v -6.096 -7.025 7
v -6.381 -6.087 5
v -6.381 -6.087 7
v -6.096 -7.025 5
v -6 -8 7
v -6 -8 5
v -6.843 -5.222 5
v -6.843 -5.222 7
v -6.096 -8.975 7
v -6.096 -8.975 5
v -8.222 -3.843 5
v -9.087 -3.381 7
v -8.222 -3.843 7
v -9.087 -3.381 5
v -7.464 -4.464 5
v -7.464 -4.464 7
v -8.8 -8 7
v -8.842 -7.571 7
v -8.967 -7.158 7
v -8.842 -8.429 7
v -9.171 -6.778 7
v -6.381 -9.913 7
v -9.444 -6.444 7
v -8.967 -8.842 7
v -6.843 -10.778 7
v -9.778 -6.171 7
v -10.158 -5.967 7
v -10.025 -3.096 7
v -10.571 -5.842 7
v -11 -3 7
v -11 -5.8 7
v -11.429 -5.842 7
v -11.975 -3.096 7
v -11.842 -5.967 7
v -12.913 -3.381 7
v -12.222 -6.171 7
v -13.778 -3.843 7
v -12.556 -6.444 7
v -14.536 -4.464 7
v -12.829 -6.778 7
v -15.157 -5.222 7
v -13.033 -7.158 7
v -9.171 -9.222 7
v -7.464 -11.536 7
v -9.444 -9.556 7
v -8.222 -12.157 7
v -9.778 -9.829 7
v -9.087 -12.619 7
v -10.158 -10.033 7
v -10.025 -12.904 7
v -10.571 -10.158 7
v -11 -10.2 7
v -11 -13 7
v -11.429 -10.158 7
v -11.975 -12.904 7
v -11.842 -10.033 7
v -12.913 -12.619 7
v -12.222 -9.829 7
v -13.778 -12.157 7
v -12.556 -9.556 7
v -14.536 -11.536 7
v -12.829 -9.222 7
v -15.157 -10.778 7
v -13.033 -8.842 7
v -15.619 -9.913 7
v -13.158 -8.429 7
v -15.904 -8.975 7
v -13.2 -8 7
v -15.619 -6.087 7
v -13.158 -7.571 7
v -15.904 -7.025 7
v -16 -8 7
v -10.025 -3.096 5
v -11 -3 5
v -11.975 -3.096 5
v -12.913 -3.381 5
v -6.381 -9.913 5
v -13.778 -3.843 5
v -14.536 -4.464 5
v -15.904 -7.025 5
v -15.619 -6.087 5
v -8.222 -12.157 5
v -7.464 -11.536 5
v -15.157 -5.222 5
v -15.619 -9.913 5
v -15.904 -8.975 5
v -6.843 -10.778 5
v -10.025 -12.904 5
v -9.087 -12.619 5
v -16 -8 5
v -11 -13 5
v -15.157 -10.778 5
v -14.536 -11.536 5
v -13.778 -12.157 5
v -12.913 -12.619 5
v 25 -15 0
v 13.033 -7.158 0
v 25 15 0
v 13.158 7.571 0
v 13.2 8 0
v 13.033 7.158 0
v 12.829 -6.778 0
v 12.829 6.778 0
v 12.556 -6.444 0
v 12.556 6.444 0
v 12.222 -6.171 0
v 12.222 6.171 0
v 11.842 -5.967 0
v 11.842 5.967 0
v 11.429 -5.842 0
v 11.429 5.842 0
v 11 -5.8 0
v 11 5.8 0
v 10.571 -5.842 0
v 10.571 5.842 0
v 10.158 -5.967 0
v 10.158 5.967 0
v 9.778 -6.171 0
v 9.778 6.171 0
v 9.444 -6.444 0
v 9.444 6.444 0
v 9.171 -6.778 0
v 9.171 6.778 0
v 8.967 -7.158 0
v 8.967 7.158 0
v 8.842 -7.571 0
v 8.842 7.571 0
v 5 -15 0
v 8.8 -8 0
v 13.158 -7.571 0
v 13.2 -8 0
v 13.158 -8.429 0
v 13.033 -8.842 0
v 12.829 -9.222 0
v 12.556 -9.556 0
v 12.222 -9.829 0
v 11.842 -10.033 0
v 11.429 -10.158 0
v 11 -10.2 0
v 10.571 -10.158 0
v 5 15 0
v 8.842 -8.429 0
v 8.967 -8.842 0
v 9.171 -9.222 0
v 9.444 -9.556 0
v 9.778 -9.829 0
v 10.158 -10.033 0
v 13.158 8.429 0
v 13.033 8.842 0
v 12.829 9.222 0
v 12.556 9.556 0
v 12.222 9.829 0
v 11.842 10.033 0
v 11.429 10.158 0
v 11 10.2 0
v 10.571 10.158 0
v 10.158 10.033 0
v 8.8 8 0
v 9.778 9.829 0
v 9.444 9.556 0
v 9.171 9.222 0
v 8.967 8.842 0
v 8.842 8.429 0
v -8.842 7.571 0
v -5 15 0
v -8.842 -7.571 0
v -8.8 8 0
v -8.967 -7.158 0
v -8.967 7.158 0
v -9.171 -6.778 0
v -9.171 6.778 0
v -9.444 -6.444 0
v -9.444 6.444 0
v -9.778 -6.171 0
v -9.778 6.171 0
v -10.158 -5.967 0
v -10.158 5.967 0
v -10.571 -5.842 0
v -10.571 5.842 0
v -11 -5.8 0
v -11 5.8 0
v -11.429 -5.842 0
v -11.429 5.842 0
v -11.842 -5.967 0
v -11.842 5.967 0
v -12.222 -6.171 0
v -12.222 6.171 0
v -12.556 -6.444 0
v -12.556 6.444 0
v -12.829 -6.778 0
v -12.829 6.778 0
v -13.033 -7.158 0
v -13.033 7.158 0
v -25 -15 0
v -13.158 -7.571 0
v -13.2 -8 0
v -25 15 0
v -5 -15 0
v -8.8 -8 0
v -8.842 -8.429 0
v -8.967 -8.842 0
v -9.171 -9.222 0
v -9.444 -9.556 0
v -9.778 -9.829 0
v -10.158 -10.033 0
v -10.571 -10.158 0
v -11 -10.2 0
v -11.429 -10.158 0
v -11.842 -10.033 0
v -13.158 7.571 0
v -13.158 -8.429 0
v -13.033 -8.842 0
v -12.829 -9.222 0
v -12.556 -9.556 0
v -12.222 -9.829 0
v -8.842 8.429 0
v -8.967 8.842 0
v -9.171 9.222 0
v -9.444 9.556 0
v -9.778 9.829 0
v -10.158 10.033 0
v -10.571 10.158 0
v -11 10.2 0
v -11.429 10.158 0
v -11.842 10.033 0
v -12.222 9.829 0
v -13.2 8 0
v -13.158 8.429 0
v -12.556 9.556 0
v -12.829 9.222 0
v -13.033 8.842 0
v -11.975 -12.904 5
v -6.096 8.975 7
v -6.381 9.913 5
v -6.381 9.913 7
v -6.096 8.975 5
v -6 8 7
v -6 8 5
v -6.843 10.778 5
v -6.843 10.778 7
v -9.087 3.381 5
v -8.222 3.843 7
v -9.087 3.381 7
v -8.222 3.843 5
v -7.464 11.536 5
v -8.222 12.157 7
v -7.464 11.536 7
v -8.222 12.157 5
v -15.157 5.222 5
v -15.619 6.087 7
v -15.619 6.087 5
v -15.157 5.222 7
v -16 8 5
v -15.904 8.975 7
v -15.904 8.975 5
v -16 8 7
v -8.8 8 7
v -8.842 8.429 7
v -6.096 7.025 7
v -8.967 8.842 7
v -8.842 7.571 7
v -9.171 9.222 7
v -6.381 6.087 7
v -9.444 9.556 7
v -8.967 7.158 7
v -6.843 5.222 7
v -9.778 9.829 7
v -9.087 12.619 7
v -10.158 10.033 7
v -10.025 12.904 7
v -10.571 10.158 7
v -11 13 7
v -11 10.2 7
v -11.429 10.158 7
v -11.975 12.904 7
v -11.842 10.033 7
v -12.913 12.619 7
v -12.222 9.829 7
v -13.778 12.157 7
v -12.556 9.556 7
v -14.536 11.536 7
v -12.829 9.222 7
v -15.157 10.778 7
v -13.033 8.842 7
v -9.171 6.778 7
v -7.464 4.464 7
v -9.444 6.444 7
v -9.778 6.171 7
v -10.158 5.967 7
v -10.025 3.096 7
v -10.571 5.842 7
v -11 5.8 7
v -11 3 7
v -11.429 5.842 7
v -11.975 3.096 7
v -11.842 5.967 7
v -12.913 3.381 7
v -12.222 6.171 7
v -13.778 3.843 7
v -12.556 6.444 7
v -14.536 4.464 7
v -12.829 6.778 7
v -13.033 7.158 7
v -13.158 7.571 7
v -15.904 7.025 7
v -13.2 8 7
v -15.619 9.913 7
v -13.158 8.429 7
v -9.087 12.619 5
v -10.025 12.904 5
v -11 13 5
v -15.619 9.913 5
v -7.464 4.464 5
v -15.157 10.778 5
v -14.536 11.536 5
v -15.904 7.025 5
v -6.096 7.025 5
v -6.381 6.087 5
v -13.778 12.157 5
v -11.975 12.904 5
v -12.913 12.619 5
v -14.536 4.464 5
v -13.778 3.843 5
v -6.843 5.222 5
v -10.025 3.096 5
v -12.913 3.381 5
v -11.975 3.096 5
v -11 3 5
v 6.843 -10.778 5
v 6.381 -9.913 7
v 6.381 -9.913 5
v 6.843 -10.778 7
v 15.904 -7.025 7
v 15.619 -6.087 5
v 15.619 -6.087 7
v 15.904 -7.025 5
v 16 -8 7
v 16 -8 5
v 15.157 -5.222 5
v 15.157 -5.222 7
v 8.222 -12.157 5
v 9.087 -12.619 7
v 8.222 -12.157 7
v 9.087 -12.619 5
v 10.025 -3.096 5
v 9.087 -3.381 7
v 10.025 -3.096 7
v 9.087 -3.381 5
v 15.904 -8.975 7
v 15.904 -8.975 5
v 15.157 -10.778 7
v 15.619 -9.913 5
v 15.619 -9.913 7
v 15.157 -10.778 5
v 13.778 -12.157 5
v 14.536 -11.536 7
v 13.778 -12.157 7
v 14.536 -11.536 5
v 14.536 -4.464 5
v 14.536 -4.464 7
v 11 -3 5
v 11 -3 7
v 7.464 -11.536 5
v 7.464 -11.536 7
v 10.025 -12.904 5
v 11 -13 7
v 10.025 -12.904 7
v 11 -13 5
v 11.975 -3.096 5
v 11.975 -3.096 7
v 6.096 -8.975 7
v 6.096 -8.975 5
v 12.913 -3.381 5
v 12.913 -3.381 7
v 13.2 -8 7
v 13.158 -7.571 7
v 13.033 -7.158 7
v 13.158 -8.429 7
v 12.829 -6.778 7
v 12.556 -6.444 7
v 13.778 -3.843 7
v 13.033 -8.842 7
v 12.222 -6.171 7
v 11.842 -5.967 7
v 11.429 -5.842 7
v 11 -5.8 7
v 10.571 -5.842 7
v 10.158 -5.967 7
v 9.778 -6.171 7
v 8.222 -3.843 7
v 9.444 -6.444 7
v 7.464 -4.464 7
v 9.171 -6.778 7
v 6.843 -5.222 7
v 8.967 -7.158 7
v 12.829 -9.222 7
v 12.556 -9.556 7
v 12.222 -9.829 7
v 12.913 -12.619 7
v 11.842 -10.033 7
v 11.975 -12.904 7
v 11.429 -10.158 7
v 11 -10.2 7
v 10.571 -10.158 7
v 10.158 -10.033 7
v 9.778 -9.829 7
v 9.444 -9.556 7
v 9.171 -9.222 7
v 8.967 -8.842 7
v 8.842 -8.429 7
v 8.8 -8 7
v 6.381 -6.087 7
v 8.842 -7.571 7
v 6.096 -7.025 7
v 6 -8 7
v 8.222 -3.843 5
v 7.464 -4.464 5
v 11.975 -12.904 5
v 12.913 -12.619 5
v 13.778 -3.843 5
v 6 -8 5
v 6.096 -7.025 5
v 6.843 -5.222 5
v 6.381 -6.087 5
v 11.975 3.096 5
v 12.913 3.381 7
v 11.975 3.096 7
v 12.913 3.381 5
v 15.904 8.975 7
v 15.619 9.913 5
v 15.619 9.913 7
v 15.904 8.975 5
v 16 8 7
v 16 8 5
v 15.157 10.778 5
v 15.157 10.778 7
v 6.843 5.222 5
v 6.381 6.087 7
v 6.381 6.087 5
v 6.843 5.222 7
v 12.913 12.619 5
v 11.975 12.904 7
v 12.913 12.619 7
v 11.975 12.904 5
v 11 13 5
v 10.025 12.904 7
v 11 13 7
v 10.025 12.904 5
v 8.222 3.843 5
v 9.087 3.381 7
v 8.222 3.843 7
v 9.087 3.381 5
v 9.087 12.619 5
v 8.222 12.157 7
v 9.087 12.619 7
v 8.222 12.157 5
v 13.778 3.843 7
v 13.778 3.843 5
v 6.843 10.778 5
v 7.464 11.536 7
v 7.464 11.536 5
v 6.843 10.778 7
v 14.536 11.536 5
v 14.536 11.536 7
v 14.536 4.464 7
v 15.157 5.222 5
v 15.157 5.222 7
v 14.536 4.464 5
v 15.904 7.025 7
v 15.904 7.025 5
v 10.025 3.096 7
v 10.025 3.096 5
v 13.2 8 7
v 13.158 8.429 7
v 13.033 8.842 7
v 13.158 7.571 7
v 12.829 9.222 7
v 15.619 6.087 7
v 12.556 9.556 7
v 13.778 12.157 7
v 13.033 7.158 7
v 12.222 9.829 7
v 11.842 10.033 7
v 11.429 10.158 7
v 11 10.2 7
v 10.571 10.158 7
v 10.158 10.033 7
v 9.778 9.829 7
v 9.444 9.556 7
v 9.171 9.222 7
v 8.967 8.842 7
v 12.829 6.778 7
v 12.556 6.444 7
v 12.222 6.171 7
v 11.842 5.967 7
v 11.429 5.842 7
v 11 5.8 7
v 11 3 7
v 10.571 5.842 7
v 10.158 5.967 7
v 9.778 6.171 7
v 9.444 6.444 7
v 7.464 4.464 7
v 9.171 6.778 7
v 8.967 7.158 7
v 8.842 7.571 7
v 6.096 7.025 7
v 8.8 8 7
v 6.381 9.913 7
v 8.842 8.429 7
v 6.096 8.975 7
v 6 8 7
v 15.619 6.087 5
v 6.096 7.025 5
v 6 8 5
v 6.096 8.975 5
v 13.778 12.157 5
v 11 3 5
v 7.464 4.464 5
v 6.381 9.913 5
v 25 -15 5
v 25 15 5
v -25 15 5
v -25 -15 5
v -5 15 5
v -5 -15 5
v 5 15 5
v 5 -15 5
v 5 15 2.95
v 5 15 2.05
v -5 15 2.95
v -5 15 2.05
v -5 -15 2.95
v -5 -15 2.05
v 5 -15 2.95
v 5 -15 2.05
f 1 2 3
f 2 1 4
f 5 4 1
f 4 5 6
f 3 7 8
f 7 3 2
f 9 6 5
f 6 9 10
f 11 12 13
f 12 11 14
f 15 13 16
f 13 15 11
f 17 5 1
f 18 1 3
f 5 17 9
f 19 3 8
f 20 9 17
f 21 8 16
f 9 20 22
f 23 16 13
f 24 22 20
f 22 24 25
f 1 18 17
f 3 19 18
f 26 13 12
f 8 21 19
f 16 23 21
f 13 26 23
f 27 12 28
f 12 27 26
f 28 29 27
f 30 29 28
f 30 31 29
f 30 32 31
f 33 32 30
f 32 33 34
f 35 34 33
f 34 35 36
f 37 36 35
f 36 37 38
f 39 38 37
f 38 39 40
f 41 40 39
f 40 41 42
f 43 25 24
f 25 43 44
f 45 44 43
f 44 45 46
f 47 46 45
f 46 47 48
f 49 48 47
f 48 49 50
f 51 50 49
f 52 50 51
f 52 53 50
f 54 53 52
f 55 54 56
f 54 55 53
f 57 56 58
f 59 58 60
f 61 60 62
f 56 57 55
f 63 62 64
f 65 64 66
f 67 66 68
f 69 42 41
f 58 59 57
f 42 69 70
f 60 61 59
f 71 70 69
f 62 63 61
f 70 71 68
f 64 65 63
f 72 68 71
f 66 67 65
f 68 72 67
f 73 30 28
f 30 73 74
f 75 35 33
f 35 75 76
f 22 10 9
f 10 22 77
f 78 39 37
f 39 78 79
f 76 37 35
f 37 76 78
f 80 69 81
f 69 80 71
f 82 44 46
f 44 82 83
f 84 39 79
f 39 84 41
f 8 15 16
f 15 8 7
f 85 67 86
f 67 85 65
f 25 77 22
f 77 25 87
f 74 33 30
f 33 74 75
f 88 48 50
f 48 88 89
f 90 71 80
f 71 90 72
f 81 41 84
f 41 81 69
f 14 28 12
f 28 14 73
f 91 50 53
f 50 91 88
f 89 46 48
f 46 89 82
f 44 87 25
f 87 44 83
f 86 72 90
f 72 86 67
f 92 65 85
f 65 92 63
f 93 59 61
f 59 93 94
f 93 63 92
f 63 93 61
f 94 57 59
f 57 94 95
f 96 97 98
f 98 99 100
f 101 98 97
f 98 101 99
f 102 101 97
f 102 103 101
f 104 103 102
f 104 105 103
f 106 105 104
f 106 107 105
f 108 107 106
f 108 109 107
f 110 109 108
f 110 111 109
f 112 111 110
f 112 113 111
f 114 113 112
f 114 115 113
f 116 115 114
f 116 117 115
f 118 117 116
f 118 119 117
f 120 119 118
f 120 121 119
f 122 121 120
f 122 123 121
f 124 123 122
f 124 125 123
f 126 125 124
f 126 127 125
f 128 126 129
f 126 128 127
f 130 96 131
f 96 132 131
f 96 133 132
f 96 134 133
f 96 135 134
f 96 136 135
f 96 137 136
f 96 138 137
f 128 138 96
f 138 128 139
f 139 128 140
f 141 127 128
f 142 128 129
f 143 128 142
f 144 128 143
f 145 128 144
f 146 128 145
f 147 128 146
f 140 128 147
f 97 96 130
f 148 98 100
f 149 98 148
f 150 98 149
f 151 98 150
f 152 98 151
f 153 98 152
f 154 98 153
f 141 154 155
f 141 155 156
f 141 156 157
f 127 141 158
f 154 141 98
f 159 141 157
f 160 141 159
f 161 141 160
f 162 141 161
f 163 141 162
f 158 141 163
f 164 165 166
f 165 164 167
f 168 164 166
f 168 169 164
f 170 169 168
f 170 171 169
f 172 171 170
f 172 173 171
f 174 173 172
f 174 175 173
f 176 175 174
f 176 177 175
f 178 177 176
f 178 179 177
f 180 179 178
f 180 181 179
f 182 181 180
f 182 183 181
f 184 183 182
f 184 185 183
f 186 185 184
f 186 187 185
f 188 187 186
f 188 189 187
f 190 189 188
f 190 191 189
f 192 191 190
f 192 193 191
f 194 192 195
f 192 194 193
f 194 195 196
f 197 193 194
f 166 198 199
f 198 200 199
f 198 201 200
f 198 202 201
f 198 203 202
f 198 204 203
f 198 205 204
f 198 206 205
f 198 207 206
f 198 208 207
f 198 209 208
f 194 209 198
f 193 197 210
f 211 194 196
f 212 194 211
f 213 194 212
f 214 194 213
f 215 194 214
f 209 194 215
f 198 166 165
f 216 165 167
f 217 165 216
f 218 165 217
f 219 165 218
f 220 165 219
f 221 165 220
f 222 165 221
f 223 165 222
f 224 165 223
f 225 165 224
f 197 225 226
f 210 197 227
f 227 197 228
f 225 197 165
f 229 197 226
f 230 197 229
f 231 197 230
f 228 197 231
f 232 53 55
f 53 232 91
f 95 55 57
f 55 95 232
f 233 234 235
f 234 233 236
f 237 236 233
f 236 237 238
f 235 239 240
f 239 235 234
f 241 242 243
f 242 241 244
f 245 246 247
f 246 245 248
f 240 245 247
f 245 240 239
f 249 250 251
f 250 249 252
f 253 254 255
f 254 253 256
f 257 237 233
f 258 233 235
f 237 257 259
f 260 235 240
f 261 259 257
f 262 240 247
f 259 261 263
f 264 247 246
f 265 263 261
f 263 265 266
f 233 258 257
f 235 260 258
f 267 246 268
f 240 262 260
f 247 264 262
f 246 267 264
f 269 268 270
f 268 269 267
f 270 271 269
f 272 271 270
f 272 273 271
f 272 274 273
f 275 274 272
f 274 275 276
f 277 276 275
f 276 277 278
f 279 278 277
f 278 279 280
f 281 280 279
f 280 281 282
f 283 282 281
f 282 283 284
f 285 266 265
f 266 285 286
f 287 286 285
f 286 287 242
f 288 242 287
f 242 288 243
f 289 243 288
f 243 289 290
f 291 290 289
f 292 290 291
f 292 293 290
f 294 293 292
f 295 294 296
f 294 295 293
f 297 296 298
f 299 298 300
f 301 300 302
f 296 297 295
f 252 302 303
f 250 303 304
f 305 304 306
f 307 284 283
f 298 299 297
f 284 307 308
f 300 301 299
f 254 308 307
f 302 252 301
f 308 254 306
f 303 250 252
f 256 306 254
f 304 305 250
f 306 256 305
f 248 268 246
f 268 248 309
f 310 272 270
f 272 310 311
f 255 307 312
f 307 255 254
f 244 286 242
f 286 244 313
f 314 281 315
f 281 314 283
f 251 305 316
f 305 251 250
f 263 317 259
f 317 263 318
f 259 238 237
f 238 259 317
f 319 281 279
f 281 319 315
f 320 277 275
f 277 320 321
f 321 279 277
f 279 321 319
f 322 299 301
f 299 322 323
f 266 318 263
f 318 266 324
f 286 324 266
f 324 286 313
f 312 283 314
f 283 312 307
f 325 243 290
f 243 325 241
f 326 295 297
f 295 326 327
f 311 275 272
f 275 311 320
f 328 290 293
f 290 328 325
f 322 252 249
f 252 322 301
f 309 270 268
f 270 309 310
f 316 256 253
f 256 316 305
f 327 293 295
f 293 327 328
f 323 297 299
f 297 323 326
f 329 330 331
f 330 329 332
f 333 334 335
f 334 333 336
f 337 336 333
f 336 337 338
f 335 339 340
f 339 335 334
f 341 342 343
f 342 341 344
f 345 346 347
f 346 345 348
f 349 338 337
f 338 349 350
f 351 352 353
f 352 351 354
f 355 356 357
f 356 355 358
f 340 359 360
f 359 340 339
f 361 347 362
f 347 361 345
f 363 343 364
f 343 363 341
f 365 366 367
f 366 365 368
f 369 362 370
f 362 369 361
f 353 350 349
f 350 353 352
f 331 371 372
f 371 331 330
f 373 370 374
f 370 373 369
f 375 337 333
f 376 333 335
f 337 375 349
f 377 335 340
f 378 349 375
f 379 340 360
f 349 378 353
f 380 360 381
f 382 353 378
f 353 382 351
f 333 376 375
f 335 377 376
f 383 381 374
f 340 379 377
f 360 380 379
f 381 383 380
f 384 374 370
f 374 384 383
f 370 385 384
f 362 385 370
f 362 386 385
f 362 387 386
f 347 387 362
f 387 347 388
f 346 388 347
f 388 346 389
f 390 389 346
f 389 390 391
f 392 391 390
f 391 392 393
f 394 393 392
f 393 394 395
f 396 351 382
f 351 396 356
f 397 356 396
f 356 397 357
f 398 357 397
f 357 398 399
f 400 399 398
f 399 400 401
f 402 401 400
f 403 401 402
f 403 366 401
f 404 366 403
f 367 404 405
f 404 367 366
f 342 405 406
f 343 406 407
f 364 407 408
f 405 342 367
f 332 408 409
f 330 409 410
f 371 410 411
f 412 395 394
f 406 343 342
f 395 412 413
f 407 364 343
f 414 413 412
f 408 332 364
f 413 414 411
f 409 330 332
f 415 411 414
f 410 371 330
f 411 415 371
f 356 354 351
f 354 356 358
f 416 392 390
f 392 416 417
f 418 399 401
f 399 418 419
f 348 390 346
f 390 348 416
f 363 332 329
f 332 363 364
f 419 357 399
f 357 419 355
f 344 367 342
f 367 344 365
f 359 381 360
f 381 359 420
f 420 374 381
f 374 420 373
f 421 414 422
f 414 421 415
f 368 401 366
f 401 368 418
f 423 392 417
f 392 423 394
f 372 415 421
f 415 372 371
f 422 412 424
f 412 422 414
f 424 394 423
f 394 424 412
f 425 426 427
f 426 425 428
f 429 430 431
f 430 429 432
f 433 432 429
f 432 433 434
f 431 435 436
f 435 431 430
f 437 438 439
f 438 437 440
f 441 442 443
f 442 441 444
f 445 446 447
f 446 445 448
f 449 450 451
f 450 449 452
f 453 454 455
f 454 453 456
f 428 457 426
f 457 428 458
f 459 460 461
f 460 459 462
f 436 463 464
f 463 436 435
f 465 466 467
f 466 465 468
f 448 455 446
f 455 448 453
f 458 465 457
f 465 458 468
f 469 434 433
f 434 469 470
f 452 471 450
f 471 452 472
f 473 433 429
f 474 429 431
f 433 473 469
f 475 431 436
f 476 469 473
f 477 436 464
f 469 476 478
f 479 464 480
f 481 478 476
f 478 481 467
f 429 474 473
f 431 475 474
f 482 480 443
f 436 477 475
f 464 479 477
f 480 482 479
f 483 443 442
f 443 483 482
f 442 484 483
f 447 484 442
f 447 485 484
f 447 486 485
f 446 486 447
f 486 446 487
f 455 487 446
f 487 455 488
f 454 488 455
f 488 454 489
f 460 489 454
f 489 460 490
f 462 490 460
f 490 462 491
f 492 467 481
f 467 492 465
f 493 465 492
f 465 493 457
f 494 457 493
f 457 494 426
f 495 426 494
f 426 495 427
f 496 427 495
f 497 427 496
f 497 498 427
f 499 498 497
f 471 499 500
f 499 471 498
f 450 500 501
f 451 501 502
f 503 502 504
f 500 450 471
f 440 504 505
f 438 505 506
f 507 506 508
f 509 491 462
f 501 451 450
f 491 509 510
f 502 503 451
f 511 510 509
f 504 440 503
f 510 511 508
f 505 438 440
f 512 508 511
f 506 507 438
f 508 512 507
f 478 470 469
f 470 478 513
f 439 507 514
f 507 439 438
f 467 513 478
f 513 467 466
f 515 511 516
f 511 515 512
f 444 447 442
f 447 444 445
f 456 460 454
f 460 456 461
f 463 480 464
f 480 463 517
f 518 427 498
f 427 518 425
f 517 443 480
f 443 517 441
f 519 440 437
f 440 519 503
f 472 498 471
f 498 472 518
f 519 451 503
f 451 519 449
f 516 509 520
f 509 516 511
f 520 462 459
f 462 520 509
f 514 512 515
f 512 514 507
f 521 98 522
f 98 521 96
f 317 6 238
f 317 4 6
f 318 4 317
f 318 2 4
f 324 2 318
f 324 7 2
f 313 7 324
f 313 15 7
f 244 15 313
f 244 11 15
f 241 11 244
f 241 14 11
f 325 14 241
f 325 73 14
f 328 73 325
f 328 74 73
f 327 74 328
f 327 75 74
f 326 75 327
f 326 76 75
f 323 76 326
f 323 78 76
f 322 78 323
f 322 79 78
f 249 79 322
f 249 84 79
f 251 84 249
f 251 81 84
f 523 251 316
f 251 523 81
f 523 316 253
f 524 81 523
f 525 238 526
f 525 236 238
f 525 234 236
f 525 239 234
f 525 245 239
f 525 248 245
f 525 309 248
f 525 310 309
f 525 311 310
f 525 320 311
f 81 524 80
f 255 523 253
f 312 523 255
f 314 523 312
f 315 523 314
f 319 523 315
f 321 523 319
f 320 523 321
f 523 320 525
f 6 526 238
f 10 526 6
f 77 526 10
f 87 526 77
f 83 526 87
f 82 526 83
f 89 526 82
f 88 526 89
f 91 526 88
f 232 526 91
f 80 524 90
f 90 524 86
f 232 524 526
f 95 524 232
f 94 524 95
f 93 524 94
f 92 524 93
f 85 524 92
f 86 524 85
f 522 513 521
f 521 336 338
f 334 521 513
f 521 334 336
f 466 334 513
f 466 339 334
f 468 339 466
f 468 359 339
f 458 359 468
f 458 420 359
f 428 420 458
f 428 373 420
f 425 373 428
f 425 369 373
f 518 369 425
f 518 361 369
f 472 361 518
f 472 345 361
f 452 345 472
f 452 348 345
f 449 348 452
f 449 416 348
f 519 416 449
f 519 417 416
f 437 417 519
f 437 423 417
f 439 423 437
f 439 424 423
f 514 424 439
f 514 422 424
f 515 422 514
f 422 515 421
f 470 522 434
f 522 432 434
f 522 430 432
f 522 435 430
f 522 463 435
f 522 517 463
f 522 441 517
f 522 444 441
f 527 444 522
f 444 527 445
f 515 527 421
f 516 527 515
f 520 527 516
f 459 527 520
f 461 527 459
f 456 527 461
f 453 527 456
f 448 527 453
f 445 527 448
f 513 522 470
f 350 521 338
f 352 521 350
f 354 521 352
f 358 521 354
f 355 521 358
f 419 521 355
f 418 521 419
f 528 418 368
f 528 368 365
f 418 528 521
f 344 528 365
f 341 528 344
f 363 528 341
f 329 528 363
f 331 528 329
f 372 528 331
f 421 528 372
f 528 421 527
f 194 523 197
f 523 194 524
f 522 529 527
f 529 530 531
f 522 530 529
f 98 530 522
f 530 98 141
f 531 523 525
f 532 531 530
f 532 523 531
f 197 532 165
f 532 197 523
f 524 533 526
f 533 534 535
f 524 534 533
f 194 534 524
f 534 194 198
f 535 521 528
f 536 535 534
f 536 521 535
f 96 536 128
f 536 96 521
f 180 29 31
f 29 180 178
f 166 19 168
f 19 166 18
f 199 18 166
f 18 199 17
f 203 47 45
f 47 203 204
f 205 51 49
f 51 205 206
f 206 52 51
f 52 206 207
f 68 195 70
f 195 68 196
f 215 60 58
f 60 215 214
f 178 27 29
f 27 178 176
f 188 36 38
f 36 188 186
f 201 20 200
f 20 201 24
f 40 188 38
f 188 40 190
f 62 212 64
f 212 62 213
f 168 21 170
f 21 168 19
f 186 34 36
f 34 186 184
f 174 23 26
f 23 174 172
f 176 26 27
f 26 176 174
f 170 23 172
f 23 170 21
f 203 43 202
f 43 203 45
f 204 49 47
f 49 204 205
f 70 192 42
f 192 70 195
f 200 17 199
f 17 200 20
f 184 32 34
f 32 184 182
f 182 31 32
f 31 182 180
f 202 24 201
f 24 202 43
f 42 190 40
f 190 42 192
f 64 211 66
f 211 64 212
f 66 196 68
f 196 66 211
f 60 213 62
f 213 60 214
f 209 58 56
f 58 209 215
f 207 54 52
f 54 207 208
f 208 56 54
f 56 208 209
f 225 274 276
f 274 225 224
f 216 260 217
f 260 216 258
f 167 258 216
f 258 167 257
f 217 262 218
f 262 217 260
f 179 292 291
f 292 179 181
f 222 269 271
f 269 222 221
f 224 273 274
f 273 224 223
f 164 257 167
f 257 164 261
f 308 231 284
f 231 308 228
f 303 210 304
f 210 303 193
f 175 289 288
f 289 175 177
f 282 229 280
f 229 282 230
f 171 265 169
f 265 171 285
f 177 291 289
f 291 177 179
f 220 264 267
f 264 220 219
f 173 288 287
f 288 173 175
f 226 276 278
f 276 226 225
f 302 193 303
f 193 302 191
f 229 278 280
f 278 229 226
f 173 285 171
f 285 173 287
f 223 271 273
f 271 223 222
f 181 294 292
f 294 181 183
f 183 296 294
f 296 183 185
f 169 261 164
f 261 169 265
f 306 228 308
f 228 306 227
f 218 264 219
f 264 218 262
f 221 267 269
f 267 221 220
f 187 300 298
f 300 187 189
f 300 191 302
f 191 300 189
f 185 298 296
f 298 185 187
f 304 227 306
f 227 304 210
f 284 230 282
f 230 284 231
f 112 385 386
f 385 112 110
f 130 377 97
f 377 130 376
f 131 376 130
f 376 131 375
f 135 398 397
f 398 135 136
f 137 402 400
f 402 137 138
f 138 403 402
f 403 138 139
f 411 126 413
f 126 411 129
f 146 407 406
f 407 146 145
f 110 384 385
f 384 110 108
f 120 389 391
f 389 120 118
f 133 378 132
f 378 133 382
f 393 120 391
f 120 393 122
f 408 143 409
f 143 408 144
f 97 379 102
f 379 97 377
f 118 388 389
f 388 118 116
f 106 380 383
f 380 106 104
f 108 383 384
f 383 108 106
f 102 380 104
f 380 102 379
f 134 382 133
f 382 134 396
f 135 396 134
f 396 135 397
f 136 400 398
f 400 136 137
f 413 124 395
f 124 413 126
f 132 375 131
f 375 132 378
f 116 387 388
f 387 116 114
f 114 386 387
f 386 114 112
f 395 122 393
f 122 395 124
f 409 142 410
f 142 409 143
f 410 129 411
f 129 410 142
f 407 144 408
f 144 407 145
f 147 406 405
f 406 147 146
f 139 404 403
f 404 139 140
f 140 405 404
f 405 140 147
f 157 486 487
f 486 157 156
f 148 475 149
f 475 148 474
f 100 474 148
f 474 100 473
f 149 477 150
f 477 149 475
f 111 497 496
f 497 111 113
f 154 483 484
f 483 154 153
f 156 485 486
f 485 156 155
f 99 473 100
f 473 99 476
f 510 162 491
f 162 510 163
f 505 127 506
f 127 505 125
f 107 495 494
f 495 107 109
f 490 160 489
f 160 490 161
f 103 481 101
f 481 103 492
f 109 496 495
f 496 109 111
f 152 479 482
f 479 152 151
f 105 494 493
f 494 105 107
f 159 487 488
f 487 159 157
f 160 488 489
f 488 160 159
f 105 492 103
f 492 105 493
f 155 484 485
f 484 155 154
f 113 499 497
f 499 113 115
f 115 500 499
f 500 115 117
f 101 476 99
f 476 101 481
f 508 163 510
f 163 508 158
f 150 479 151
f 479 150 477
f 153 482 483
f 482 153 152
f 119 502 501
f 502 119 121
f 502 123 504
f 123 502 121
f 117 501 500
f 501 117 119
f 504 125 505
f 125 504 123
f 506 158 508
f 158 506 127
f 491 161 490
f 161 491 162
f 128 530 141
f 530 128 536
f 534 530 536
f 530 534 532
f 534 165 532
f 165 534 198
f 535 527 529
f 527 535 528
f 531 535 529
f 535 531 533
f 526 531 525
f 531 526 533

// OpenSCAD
$fn = 32;

// ----------------------------------------------------------------------
// Living hinge: 50 x 30 mm plates, 0.9 mm flexible web
// ----------------------------------------------------------------------

// --- parameters (mm) ---
plate_len = 20;           // plate length outside the web
plate_w = 30;             // plate width
thick = 5;                // plate thickness
web_half = 5;             // half width of the flex band
web_t = 0.9;              // flexible web thickness
web_z = 2.05;             // web position inside the thickness
boss_d = 10;              // screw boss diameter
boss_h = 7;               // screw boss height
boss_x = 11;              // screw boss distance from the web
screw_d = 4.4;            // screw hole

difference() {
  union() {
    /* one flat strip, later thinned at the middle */
    translate([-25, -15, 0]) cube([50, 30, 5]);
    /* screw bosses, sunk 0.5 mm into the plates */
    for (sx = [-11, 11]) {
      for (sy = [-8, 8]) {
        translate([sx, sy, 0]) cylinder(h = boss_h, d = boss_d);
      }
    }
  }
  /* channel from below: leaves the web on top of it */
  translate([-5, -17.5, -2.5]) cube([10, 35, 4.55]);
  /* channel from above: thins the web down to web_t */
  translate([-5, -17.5, 2.95]) cube([10, 35, 4.55]);
  /* screw holes through the bosses */
  for (sx = [-11, 11]) {
    for (sy = [-8, 8]) {
      translate([sx, sy, -2.5]) cylinder(h = boss_h + 5, d = screw_d);
    }
  }
}
